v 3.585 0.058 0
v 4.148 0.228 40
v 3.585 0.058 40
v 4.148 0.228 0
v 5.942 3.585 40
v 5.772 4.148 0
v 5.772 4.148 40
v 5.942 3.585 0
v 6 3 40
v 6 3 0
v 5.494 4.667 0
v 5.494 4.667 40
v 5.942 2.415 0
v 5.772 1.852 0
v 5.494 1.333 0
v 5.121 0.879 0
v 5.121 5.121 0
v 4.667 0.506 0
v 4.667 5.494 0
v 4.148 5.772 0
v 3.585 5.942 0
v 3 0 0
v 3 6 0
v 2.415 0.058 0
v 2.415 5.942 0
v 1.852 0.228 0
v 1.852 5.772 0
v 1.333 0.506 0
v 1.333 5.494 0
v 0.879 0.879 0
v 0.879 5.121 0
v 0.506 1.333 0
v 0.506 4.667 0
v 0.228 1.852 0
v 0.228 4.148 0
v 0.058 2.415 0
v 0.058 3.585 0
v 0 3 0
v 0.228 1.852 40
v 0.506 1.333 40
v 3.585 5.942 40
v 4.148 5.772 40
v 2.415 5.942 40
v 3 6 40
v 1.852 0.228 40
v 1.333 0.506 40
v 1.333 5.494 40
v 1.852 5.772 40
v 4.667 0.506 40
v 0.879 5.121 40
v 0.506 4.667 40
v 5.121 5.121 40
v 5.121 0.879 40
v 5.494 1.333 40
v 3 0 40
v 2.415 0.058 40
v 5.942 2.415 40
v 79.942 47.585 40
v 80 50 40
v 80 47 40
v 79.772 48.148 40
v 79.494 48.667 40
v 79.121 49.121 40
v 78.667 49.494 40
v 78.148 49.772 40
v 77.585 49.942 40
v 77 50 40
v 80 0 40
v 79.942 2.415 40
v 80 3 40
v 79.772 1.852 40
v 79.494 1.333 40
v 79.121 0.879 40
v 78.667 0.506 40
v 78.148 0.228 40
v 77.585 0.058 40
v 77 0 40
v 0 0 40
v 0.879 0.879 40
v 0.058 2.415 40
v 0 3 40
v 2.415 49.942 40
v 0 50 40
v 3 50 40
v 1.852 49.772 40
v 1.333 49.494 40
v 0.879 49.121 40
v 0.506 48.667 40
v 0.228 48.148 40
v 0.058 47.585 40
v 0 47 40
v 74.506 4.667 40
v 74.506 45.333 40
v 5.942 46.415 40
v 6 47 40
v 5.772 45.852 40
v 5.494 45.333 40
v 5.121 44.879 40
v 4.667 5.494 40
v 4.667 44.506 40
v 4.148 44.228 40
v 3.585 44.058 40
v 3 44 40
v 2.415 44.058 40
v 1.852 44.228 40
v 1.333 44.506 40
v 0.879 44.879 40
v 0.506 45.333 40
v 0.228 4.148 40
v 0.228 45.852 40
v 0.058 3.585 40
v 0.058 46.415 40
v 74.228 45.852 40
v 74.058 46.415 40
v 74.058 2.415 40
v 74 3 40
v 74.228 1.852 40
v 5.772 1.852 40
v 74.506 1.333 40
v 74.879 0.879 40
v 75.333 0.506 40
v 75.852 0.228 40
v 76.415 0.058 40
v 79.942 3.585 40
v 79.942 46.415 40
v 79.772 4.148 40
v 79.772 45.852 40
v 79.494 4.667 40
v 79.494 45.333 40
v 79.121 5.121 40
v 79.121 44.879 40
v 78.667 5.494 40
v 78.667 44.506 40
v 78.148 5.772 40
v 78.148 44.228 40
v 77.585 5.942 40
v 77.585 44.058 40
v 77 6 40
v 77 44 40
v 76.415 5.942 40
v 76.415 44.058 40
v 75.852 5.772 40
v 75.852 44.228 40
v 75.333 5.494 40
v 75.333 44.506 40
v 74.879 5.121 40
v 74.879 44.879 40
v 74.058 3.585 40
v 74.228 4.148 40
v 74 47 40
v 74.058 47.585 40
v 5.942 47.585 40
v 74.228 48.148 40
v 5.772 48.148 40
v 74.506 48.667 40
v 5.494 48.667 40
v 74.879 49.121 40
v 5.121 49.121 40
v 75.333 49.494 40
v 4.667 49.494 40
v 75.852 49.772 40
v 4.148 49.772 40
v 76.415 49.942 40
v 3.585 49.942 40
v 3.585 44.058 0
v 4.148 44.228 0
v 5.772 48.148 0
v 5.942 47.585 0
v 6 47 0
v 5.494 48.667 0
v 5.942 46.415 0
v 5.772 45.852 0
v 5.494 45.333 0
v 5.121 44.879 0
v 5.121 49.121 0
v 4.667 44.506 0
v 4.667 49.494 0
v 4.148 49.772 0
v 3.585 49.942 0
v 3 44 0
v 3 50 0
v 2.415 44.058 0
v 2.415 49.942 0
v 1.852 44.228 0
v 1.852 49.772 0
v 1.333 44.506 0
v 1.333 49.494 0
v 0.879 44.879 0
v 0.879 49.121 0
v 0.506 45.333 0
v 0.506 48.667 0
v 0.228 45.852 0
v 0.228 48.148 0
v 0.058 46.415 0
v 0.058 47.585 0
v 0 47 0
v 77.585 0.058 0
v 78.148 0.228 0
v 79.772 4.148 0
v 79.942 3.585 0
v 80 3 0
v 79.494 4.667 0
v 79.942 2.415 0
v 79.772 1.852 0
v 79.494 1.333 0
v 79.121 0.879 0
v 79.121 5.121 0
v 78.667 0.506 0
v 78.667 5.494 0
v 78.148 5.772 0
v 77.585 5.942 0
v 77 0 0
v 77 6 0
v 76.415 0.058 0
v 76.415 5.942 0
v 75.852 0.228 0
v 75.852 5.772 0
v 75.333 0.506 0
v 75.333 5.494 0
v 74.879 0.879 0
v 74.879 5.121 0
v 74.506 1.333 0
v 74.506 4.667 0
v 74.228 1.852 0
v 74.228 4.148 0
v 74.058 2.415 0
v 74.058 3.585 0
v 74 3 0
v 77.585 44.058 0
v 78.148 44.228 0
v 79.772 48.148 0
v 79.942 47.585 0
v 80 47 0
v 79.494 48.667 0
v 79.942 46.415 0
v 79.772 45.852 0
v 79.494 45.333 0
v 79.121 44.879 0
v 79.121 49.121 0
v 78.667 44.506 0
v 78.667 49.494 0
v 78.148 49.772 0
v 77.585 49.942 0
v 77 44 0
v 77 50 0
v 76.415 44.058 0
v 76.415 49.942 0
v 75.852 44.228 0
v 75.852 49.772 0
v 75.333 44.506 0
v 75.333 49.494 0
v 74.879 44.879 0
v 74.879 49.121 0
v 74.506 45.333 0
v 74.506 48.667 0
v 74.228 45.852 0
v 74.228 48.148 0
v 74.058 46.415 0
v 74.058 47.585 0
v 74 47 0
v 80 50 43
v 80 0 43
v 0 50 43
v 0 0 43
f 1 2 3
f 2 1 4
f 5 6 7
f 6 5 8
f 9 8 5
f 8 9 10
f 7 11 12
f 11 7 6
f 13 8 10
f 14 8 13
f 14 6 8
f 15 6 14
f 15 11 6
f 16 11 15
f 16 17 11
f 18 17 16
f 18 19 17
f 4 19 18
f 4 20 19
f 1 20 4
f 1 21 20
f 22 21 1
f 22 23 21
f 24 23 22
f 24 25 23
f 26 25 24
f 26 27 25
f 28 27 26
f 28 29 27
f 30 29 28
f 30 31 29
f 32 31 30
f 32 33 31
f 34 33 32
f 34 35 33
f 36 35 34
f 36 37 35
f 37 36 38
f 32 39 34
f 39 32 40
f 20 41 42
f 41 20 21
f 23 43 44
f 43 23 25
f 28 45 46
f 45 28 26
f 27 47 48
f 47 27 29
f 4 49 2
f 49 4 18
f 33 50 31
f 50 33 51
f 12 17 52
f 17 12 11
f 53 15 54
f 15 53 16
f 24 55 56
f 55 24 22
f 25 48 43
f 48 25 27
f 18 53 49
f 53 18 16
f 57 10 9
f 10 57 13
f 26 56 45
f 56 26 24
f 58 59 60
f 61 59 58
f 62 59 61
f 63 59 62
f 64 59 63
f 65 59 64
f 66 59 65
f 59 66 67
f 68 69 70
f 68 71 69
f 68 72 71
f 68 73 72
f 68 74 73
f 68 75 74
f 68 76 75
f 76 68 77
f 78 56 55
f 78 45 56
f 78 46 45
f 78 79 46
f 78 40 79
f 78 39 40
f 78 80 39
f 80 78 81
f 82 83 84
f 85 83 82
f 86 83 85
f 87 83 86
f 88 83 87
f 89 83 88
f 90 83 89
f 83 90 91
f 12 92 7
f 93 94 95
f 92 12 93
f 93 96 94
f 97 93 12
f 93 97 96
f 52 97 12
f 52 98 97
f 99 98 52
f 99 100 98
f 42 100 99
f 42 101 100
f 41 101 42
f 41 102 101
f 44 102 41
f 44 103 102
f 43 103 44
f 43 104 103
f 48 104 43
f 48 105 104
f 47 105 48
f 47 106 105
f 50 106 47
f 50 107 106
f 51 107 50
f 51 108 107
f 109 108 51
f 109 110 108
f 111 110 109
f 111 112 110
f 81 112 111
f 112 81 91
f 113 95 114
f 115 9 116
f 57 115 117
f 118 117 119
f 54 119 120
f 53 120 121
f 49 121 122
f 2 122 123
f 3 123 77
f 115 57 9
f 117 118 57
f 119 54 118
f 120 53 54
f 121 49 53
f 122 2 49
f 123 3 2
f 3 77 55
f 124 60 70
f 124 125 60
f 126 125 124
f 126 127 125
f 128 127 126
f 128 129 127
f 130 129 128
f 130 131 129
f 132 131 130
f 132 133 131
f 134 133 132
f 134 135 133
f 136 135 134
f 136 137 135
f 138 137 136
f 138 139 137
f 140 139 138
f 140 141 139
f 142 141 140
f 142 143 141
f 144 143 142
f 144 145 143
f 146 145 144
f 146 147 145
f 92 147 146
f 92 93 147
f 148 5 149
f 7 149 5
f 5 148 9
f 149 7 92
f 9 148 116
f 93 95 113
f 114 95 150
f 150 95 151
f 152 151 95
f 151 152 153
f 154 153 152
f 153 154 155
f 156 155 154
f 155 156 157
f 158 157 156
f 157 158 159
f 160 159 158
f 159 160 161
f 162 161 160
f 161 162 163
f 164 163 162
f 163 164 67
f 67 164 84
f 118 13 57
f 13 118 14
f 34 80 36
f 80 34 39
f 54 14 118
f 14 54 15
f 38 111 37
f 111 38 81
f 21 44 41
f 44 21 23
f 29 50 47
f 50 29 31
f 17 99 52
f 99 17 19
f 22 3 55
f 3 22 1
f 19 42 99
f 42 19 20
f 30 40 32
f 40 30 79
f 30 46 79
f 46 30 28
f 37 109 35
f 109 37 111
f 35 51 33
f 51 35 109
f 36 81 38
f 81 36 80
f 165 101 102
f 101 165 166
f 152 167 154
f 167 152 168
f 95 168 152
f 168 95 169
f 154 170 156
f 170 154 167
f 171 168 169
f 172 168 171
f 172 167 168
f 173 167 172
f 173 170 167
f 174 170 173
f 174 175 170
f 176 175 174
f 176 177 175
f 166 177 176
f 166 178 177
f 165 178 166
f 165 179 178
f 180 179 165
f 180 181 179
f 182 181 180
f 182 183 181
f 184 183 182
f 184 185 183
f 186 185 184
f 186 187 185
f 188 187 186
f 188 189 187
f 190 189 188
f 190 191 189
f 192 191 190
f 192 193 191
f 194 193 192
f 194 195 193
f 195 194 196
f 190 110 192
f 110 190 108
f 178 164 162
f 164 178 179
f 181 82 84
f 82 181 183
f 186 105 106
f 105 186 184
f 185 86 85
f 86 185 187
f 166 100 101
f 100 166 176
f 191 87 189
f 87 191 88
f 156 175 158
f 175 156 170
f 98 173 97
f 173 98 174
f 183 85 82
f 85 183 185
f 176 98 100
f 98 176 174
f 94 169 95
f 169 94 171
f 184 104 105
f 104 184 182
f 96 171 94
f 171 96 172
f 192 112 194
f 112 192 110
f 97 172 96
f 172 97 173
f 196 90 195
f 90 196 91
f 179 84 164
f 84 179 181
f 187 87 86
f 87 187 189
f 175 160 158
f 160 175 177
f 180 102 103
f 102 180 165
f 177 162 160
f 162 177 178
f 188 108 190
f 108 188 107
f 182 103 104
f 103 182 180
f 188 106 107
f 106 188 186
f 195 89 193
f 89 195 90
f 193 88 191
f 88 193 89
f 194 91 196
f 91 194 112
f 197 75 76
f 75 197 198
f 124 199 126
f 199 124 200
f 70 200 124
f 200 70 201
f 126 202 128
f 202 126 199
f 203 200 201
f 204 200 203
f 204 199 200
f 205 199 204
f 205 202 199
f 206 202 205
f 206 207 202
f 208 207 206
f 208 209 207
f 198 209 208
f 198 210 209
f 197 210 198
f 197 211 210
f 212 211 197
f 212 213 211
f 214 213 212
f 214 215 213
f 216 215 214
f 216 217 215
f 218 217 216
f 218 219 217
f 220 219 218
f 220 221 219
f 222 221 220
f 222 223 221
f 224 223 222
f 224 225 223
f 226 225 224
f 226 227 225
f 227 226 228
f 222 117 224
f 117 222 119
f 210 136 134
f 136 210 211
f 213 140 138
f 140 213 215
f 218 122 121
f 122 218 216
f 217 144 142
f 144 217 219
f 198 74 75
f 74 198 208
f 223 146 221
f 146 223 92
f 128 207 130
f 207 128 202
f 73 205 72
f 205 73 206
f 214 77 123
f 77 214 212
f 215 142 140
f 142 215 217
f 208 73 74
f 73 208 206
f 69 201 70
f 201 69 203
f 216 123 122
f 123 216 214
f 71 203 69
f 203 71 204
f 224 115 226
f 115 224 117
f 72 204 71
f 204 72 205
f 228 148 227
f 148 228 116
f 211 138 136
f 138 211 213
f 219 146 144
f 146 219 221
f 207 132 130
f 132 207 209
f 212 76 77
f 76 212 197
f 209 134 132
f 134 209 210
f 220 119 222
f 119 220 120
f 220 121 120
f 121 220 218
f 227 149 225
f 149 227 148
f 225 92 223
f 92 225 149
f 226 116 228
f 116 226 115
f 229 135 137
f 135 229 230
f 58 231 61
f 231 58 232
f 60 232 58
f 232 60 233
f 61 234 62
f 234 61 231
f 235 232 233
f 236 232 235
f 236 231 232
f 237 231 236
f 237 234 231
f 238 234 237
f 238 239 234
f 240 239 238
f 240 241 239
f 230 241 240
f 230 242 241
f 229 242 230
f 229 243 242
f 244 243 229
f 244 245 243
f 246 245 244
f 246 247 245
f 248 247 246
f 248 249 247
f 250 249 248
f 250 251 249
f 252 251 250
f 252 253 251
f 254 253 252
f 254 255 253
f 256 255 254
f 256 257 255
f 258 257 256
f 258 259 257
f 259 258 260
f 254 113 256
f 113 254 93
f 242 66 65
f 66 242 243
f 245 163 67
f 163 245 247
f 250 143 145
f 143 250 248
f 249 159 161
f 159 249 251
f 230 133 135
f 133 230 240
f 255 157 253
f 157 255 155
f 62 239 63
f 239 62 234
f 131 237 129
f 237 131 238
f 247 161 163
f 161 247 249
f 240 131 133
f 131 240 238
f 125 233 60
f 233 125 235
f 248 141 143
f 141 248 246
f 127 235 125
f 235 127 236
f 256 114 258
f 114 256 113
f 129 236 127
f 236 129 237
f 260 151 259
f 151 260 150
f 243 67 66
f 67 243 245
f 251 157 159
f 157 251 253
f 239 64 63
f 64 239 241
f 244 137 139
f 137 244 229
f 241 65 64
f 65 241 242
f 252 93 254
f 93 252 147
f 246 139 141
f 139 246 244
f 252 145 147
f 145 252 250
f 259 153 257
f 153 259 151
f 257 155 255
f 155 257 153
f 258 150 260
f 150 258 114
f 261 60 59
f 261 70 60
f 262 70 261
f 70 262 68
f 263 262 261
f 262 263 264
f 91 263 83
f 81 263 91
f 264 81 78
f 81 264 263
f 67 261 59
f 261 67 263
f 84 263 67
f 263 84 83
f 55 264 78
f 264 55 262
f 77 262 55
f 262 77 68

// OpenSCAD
// Volume: 16494.879516308847, SurfaceArea: 11791.08604753301
module leg(h = 40, r = 3) {
    cylinder(h=h, r=r, $fn=32);
}

module table(w = 80, d = 50, h = 40, top_t = 3) {
    // tabletop
    translate([0, 0, h])
        cube([w, d, top_t]);

    // four legs
    for (x = [0, w - 6], y = [0, d - 6]) {
        translate([x + 3, y + 3, 0])
            leg(h=h);
    }
}

table();
